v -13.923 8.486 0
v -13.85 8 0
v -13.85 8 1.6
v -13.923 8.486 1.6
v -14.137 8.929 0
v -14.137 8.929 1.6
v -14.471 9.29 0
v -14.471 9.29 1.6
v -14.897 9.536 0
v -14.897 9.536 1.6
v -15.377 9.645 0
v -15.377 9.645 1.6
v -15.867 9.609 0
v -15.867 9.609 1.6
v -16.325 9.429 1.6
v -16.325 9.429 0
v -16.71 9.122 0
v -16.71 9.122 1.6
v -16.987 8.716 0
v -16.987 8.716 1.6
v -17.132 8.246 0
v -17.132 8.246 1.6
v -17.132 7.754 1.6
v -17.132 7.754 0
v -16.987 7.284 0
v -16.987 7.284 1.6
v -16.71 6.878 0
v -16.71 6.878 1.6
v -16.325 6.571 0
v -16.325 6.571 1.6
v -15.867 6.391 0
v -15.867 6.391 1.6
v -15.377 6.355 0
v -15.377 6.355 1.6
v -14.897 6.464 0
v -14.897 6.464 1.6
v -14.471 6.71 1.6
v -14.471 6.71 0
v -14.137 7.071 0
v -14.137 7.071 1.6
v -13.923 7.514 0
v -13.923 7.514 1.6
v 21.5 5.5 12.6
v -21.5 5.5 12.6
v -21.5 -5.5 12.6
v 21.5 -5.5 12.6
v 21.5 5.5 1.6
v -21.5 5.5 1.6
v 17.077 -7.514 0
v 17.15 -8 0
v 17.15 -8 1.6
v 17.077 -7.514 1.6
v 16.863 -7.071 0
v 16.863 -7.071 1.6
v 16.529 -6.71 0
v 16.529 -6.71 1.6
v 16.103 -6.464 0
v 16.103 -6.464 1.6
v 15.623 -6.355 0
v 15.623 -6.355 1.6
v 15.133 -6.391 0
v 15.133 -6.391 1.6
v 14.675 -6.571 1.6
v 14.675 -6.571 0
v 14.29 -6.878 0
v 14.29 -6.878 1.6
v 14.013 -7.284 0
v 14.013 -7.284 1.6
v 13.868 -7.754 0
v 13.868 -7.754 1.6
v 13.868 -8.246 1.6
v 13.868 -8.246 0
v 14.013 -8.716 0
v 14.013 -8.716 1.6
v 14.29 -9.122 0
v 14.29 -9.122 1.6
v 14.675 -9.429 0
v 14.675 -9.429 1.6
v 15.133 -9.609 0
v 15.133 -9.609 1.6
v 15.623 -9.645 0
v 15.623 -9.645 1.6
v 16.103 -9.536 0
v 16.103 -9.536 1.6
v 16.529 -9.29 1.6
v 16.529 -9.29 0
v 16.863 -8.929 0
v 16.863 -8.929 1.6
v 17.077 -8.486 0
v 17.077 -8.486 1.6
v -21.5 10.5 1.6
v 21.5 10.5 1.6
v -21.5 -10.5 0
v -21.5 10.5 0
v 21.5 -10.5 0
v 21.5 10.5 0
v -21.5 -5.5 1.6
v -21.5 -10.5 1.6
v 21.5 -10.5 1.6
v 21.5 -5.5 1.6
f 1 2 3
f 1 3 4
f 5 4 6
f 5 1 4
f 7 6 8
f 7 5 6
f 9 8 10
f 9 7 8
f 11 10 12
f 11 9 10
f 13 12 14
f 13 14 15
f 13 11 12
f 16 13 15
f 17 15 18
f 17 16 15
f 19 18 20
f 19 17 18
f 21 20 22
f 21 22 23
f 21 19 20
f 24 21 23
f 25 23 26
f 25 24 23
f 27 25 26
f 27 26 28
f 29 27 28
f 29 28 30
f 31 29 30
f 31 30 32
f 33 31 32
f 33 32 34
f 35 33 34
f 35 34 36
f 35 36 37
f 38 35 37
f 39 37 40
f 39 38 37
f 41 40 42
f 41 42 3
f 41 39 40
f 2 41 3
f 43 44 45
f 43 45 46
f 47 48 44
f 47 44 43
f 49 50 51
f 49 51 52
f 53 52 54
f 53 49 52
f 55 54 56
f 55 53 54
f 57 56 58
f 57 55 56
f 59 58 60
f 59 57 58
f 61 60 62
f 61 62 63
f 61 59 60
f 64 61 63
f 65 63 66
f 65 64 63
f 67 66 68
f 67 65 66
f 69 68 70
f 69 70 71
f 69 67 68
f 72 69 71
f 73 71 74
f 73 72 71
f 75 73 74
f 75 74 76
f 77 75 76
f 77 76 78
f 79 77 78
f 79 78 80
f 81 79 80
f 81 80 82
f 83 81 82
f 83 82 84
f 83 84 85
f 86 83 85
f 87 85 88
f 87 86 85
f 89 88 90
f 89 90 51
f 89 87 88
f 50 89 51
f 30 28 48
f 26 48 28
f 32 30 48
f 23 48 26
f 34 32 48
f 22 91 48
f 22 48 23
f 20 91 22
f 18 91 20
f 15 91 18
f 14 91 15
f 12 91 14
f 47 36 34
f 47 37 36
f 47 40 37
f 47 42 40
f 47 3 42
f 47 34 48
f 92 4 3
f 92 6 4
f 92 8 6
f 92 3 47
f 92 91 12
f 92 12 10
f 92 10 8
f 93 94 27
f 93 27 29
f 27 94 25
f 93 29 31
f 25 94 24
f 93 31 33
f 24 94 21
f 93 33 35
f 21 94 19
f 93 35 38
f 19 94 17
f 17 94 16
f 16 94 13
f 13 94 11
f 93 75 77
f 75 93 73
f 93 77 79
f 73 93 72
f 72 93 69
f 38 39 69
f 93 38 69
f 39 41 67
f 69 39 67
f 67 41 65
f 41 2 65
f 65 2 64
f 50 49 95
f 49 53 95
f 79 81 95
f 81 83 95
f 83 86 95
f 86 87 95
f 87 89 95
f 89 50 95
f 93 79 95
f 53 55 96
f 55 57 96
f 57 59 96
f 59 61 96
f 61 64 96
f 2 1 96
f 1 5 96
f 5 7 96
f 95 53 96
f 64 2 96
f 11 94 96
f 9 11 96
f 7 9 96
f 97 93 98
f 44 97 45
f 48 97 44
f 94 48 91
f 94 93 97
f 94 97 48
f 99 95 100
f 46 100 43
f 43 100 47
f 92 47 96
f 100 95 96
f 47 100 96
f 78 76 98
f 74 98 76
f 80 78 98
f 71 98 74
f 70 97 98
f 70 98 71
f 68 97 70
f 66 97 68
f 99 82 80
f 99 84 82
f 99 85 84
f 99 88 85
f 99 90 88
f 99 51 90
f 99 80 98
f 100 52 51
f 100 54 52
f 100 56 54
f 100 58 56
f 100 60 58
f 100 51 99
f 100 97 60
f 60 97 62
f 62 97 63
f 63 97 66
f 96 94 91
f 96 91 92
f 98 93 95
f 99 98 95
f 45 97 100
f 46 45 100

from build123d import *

# Parameters (mm, degrees)
F0_W     = 43
F0_H     = 21
F0_R     = 1.65
F1_DEPTH = 1.6
F2_W     = 43
F2_H     = 11
F3_DEPTH = 11


with BuildPart() as f1:
    # F0 (on Top) → F1 (new body)
    with BuildSketch(Plane.XY):
        Rectangle(F0_W, F0_H)
        with Locations((15.5, -8)):
            Circle(F0_R, mode=Mode.SUBTRACT)
        with Locations((-15.5, 8)):
            Circle(F0_R, mode=Mode.SUBTRACT)
    extrude(amount=F1_DEPTH)

    # F2 (on face) → F3 (join)
    with BuildSketch(Plane.XY.offset(1.6)):
        Rectangle(F2_W, F2_H)
    extrude(amount=F3_DEPTH)


solid = f1.part
